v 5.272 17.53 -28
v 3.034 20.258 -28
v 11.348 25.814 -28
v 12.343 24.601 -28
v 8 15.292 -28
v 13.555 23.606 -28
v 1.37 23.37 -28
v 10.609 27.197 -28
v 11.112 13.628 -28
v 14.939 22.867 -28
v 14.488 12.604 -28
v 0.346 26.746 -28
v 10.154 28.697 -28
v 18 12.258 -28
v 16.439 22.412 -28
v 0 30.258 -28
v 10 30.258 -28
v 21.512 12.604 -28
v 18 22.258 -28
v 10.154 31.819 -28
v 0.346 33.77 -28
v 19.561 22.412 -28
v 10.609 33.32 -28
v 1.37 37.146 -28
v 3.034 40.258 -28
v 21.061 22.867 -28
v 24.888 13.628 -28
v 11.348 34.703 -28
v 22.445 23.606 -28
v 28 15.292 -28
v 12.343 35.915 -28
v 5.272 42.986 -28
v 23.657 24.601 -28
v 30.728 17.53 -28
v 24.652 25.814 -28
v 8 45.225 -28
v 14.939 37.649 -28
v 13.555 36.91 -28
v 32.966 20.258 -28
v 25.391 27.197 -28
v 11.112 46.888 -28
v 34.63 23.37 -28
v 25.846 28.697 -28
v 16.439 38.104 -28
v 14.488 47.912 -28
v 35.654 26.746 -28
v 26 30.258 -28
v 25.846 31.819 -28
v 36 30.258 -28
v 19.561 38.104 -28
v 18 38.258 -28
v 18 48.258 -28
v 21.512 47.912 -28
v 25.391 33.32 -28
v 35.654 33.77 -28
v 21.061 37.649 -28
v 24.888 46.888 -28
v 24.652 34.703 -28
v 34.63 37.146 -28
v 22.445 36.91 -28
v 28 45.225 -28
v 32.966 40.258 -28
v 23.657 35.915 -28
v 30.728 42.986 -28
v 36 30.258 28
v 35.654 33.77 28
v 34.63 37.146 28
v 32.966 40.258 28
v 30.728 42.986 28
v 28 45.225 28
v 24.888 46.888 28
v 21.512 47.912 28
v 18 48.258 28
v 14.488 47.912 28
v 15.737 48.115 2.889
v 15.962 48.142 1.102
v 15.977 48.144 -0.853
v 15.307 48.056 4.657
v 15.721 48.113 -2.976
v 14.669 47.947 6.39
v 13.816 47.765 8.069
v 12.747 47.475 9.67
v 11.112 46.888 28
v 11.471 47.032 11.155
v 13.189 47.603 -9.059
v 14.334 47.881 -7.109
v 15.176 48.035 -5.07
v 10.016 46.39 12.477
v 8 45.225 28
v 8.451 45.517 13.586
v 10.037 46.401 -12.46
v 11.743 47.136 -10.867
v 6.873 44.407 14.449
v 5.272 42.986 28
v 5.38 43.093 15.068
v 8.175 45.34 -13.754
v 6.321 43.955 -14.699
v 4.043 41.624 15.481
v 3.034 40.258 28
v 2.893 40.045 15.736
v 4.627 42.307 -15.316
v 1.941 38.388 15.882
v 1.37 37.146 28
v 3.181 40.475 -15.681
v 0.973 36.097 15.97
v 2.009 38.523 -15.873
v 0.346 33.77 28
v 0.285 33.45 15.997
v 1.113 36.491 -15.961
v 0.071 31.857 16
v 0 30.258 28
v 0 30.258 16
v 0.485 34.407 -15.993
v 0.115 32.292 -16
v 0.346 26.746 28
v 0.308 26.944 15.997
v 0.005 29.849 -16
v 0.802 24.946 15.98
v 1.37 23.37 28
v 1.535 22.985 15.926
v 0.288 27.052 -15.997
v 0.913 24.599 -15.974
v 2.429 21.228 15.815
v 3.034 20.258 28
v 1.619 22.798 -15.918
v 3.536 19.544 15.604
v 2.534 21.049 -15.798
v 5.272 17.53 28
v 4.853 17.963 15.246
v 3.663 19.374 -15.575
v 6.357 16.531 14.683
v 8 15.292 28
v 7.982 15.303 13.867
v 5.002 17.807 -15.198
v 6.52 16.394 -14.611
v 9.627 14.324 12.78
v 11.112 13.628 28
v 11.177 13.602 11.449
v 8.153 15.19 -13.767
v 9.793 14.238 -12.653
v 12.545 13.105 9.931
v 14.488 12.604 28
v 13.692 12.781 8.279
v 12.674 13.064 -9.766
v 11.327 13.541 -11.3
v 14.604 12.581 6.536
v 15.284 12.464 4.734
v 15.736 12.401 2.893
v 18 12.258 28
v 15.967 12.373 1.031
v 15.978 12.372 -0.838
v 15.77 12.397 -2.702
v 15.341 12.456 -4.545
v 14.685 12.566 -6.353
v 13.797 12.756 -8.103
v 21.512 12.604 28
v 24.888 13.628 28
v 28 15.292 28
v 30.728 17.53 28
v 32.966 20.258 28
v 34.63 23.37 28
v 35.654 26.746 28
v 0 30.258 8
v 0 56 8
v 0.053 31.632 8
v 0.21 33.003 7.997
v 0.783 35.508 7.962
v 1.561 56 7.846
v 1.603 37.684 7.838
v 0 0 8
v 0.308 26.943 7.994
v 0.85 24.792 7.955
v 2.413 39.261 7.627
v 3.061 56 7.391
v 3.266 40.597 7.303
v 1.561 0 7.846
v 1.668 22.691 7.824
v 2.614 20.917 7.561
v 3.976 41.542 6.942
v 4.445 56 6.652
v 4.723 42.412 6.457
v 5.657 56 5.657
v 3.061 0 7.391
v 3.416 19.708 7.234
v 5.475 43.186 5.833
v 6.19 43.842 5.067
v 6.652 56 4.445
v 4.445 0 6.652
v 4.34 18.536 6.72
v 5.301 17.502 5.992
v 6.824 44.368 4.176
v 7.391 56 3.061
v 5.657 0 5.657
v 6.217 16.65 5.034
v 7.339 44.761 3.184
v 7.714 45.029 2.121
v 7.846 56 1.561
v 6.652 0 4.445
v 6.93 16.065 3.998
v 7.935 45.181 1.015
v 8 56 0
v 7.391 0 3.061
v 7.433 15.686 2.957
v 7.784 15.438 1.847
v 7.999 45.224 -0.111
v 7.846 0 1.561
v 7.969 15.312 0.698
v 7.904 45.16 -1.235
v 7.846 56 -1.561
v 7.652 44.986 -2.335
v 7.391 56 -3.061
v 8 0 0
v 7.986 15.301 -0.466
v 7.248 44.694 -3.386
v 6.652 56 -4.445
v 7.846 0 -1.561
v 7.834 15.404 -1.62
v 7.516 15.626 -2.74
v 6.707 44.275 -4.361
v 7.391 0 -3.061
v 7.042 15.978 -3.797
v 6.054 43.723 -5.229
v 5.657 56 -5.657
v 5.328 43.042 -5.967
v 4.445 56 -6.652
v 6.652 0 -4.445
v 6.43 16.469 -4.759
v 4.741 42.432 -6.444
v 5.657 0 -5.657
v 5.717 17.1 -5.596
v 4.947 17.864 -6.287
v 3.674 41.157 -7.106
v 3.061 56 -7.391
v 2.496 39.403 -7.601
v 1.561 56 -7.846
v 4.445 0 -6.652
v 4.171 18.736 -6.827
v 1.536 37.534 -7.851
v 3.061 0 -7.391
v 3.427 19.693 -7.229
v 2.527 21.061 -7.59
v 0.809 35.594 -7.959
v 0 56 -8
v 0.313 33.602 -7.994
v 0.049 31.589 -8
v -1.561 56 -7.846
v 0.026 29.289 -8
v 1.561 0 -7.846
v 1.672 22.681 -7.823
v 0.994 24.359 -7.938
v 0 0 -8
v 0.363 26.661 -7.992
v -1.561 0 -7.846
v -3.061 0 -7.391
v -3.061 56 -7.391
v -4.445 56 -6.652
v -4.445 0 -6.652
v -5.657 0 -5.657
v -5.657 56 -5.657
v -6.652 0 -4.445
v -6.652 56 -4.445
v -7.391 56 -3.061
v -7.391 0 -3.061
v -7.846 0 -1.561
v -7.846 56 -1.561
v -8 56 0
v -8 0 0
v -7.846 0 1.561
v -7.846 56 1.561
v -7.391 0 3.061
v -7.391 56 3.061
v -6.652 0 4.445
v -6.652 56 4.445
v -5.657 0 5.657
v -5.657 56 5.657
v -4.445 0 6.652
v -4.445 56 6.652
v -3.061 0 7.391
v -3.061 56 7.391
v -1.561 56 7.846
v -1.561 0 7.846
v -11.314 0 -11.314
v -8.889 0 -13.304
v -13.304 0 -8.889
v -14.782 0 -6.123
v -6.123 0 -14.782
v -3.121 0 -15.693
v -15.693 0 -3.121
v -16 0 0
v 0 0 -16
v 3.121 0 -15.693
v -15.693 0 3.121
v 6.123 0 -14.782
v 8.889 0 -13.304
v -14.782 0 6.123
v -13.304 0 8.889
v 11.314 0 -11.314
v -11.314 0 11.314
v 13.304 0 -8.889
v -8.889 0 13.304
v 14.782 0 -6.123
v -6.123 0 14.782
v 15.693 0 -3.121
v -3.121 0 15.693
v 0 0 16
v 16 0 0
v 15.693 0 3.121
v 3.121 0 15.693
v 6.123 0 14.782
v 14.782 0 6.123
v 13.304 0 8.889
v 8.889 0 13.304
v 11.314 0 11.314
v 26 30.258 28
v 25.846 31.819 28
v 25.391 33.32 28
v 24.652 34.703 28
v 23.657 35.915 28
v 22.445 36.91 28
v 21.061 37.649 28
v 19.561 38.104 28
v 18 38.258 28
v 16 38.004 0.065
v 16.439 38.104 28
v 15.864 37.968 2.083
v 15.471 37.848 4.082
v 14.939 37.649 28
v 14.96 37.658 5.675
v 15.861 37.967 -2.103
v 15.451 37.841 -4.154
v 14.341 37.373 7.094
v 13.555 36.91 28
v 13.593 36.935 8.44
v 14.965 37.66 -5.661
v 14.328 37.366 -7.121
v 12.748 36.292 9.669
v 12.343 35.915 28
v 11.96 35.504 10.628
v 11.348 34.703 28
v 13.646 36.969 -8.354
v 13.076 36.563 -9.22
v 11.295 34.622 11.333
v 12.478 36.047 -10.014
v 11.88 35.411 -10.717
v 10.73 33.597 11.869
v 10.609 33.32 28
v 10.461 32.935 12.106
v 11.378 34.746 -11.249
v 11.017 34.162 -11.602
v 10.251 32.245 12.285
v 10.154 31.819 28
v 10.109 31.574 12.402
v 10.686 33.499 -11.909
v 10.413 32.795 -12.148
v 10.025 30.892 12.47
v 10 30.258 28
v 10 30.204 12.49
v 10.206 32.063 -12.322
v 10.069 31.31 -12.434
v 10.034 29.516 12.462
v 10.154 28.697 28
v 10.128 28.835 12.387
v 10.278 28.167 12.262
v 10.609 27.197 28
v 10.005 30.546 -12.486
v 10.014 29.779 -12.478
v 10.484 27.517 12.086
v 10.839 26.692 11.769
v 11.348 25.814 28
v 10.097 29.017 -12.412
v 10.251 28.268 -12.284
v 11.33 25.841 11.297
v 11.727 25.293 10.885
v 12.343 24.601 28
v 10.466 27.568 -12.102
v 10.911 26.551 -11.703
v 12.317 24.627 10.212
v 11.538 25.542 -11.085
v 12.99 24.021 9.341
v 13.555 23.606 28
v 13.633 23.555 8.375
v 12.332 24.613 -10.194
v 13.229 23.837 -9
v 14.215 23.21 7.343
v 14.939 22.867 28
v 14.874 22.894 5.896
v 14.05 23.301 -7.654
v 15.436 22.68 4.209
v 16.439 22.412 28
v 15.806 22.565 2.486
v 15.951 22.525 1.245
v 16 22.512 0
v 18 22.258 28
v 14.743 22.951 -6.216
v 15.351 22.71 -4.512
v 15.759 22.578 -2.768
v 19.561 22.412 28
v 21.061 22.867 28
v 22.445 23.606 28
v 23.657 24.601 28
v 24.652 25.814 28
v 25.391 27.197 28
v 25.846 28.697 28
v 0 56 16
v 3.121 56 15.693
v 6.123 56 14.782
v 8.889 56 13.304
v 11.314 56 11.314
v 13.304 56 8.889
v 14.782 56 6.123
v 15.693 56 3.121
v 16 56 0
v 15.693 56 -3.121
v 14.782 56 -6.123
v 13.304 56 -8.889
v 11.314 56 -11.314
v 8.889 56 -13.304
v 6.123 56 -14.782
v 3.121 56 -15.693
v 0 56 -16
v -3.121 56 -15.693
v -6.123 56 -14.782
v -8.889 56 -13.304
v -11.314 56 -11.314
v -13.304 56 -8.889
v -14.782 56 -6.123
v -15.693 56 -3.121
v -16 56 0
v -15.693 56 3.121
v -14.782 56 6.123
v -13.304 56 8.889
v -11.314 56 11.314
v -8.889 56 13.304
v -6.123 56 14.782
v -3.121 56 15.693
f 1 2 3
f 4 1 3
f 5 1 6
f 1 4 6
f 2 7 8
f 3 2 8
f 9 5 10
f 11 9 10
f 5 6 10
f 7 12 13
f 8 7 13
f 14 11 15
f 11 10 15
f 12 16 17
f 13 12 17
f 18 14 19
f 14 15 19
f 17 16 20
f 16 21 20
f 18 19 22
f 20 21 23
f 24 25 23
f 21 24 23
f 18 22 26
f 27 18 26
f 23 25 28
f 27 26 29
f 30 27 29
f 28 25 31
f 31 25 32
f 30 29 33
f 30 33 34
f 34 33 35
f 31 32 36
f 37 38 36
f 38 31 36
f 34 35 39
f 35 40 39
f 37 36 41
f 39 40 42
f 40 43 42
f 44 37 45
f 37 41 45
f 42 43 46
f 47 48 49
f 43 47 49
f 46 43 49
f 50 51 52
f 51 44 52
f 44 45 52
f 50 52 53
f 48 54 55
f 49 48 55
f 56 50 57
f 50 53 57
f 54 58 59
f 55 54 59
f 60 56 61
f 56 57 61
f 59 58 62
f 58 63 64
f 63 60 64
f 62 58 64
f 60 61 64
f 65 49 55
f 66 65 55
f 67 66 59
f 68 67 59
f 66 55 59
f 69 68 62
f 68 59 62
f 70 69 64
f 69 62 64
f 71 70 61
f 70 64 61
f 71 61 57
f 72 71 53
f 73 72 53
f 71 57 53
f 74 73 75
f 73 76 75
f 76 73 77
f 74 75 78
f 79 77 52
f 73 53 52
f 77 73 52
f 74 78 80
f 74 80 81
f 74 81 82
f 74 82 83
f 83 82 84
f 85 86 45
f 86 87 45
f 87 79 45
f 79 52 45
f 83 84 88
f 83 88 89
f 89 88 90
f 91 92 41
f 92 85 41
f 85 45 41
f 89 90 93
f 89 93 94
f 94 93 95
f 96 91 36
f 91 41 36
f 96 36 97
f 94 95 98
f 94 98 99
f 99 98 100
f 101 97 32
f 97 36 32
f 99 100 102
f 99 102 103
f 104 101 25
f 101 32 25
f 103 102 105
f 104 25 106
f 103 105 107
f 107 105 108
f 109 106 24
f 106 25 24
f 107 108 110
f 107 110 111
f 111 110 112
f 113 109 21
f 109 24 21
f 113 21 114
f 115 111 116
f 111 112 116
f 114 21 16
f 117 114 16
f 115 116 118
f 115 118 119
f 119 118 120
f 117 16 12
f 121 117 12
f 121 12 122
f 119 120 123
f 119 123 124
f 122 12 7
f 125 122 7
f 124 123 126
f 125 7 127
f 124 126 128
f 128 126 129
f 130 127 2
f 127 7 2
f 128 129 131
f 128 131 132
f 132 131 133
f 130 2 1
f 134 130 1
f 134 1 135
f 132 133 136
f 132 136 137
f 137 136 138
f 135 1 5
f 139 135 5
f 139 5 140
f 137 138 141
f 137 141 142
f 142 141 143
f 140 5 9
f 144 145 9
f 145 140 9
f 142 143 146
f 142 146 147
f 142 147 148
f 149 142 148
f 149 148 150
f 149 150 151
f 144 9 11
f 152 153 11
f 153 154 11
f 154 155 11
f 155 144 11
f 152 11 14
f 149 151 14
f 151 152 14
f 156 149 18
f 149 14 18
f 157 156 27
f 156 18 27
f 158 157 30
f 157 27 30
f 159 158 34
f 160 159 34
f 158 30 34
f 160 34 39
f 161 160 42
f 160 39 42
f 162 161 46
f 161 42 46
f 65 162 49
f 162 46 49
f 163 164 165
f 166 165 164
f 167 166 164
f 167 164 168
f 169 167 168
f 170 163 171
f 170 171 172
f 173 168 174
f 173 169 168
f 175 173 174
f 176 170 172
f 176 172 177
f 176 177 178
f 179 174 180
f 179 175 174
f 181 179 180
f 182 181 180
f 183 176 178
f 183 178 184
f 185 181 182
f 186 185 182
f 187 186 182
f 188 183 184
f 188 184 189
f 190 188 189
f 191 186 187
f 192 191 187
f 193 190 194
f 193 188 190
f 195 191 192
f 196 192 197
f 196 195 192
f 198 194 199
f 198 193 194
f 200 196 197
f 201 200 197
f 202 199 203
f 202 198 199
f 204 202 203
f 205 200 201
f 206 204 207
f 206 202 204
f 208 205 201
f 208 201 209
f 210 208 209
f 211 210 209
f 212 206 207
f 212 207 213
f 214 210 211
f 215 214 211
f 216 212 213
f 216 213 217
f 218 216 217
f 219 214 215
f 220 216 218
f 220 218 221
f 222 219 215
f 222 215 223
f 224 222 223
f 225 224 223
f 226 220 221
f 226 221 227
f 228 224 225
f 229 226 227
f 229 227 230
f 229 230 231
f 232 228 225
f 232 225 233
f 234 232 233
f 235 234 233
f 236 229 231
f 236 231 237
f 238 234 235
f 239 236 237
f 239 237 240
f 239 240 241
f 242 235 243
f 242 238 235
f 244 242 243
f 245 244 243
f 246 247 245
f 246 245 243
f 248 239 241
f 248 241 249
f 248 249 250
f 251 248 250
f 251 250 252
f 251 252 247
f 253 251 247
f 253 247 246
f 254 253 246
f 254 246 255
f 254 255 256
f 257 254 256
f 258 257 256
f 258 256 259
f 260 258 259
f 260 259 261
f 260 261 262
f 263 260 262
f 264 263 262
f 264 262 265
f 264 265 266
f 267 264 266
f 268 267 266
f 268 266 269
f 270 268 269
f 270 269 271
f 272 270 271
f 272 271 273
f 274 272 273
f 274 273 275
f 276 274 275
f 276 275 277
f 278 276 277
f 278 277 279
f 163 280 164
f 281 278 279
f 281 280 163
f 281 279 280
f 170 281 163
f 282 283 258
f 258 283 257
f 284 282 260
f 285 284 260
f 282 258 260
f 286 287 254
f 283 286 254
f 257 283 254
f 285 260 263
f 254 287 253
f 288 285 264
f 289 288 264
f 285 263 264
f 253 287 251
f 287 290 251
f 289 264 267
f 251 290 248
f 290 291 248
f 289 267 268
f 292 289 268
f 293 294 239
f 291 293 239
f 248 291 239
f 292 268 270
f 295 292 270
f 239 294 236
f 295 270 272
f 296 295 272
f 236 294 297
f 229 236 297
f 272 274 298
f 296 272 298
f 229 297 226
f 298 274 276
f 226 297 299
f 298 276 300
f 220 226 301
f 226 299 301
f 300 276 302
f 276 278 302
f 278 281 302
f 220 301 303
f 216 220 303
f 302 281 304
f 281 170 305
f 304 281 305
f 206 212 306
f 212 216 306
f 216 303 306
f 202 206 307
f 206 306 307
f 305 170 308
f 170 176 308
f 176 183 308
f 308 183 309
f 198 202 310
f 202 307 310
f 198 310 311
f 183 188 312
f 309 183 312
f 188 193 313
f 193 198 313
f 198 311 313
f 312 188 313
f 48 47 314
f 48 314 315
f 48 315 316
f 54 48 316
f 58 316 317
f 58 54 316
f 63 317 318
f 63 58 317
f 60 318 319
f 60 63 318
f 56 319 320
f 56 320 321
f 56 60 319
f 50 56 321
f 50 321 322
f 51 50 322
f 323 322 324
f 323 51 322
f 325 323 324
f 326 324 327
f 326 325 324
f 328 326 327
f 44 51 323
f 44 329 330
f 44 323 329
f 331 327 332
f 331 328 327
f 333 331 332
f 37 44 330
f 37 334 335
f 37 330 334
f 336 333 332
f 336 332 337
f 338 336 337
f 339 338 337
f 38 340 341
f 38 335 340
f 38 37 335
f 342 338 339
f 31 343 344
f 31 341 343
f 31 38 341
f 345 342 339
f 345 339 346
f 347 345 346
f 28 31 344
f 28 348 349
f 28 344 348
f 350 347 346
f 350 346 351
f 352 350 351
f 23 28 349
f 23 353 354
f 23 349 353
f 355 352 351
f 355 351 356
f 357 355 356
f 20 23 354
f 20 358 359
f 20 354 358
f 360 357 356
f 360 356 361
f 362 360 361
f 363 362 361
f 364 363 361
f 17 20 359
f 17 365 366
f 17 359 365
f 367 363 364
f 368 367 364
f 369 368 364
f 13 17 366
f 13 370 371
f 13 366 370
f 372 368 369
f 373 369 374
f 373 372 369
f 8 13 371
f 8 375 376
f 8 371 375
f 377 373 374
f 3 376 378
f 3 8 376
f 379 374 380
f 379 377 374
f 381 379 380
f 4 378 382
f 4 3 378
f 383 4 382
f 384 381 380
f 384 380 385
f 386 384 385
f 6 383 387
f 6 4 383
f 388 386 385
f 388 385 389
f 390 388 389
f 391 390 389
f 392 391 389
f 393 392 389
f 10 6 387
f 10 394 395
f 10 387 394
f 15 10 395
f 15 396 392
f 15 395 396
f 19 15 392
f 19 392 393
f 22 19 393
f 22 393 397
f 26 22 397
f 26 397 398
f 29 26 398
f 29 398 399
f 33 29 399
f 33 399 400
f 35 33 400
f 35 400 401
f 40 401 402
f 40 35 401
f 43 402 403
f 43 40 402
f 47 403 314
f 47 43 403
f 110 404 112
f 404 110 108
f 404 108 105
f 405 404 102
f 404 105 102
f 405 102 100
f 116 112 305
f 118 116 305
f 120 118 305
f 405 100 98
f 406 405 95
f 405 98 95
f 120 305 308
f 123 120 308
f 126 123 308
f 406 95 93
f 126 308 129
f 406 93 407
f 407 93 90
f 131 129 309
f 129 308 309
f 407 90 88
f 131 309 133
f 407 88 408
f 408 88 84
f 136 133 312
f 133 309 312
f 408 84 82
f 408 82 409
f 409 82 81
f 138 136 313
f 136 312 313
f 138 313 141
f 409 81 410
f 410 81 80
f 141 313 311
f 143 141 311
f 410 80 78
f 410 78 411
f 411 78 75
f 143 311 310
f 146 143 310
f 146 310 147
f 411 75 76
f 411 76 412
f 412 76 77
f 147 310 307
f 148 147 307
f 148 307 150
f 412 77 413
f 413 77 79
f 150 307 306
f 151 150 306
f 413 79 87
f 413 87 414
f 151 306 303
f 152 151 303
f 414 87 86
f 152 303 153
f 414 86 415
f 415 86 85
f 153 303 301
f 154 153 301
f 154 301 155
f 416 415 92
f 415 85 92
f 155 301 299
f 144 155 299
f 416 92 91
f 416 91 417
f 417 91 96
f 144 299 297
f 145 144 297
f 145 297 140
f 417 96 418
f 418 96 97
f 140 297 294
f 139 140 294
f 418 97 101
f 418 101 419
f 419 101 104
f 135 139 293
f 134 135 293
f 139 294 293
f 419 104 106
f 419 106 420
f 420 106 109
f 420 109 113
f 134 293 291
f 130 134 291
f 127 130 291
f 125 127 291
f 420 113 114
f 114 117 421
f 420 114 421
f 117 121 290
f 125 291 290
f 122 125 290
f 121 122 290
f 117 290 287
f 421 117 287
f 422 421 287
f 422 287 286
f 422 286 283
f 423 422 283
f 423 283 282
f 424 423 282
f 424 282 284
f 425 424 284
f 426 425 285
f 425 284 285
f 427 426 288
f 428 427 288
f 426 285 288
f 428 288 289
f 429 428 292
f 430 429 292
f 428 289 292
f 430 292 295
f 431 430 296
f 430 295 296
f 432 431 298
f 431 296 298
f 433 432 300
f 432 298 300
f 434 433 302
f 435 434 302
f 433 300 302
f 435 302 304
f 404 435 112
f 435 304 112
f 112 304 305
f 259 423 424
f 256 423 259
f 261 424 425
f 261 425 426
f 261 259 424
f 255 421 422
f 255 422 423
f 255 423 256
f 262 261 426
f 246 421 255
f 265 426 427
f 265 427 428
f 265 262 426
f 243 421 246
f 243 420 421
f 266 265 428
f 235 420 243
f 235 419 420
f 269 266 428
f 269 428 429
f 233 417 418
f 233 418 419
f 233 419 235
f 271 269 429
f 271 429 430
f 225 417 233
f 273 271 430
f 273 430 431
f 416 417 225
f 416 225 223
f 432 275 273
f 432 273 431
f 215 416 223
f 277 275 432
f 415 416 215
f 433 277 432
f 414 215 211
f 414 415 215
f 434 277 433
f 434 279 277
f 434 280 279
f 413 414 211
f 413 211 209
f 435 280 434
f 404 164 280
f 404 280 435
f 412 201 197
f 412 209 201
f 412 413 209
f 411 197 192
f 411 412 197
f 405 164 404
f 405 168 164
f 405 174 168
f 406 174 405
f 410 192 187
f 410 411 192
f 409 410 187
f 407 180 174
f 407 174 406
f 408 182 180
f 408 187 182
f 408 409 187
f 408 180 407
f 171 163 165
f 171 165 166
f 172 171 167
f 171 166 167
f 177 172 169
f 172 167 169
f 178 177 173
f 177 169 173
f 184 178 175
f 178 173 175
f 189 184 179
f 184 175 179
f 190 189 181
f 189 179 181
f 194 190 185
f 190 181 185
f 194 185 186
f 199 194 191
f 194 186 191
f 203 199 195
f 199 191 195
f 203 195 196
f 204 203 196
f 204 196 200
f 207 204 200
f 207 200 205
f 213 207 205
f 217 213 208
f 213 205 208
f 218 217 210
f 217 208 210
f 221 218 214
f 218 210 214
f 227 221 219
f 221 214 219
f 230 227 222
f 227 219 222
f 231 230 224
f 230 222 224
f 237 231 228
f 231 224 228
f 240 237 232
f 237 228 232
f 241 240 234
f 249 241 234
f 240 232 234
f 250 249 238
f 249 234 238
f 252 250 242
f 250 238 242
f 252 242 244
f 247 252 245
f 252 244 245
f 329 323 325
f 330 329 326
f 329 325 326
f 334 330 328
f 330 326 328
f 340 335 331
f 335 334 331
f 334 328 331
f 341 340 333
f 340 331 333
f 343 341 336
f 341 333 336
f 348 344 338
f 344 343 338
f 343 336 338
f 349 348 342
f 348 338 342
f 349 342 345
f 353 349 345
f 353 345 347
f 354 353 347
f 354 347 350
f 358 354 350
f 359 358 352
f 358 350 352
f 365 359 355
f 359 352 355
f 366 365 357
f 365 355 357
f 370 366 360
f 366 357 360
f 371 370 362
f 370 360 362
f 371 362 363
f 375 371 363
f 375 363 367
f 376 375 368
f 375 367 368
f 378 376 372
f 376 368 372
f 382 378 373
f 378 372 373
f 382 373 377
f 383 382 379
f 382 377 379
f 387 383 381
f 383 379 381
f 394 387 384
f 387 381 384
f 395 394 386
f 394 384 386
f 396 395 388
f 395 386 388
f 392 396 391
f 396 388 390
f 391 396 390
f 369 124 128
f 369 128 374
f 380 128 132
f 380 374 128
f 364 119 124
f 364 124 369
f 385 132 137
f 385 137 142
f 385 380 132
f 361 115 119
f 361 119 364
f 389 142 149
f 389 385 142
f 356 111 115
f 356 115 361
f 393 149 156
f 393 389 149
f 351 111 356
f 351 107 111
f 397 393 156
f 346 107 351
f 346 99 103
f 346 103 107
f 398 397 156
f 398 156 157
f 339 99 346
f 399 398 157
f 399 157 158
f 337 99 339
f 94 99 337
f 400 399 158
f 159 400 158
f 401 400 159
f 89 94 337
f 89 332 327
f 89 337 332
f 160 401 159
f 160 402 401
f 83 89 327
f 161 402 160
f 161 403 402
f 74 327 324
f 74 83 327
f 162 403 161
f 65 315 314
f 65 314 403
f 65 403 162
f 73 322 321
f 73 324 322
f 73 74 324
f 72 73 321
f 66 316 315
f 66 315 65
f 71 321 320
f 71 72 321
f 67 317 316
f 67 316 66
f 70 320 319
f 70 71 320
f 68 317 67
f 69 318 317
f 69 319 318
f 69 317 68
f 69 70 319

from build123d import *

# Parameters (mm, degrees)
SKETCH1_R                = 16
SKETCH1_R_2              = 8
BOSS_EXTRUDE1_DEPTH      = 56
BOSS_EXTRUDE2_DEPTH      = 28
BOSS_EXTRUDE2_DEPTH_BACK = 28
SKETCH2_R                = 18
SKETCH2_R_2              = 8
SKETCH3_R                = 8
CUT_EXTRUDE1_DEPTH       = 73.221880507
SKETCH4_R                = 8
CUT_EXTRUDE2_DEPTH       = 87.994252854


with BuildPart() as part:
    # Sketch1 → Boss-Extrude1 (new body)
    with BuildSketch(Plane(origin=(0, 0, 0), x_dir=(1, 0, 0), z_dir=(0, 1, 0))):
        Circle(SKETCH1_R)
        Circle(SKETCH1_R_2, mode=Mode.SUBTRACT)
    extrude(amount=BOSS_EXTRUDE1_DEPTH)

    # Sketch2 → Boss-Extrude2 (add, two sides: drawn at the far end of the back side and taken through both)
    with BuildSketch(Plane.XY.offset(-BOSS_EXTRUDE2_DEPTH_BACK)):
        with Locations((18, 30.258098715)):
            Circle(SKETCH2_R)
        with Locations((18, 30.258098715)):
            Circle(SKETCH2_R_2, mode=Mode.SUBTRACT)
    extrude(amount=BOSS_EXTRUDE2_DEPTH + BOSS_EXTRUDE2_DEPTH_BACK)

    # Sketch3 → Cut-Extrude1 (cut, through all)
    with BuildSketch(Plane(origin=(0, 56, 0), x_dir=(1, 0, 0), z_dir=(0, 1, 0))):
        Circle(SKETCH3_R)
    extrude(amount=-CUT_EXTRUDE1_DEPTH, mode=Mode.SUBTRACT)

    # Sketch4 → Cut-Extrude2 (cut, through all)
    with BuildSketch(Plane.XY.offset(28)):
        with Locations((18, 30.258098715)):
            Circle(SKETCH4_R)
    extrude(amount=-CUT_EXTRUDE2_DEPTH, mode=Mode.SUBTRACT)


solid = part.part
